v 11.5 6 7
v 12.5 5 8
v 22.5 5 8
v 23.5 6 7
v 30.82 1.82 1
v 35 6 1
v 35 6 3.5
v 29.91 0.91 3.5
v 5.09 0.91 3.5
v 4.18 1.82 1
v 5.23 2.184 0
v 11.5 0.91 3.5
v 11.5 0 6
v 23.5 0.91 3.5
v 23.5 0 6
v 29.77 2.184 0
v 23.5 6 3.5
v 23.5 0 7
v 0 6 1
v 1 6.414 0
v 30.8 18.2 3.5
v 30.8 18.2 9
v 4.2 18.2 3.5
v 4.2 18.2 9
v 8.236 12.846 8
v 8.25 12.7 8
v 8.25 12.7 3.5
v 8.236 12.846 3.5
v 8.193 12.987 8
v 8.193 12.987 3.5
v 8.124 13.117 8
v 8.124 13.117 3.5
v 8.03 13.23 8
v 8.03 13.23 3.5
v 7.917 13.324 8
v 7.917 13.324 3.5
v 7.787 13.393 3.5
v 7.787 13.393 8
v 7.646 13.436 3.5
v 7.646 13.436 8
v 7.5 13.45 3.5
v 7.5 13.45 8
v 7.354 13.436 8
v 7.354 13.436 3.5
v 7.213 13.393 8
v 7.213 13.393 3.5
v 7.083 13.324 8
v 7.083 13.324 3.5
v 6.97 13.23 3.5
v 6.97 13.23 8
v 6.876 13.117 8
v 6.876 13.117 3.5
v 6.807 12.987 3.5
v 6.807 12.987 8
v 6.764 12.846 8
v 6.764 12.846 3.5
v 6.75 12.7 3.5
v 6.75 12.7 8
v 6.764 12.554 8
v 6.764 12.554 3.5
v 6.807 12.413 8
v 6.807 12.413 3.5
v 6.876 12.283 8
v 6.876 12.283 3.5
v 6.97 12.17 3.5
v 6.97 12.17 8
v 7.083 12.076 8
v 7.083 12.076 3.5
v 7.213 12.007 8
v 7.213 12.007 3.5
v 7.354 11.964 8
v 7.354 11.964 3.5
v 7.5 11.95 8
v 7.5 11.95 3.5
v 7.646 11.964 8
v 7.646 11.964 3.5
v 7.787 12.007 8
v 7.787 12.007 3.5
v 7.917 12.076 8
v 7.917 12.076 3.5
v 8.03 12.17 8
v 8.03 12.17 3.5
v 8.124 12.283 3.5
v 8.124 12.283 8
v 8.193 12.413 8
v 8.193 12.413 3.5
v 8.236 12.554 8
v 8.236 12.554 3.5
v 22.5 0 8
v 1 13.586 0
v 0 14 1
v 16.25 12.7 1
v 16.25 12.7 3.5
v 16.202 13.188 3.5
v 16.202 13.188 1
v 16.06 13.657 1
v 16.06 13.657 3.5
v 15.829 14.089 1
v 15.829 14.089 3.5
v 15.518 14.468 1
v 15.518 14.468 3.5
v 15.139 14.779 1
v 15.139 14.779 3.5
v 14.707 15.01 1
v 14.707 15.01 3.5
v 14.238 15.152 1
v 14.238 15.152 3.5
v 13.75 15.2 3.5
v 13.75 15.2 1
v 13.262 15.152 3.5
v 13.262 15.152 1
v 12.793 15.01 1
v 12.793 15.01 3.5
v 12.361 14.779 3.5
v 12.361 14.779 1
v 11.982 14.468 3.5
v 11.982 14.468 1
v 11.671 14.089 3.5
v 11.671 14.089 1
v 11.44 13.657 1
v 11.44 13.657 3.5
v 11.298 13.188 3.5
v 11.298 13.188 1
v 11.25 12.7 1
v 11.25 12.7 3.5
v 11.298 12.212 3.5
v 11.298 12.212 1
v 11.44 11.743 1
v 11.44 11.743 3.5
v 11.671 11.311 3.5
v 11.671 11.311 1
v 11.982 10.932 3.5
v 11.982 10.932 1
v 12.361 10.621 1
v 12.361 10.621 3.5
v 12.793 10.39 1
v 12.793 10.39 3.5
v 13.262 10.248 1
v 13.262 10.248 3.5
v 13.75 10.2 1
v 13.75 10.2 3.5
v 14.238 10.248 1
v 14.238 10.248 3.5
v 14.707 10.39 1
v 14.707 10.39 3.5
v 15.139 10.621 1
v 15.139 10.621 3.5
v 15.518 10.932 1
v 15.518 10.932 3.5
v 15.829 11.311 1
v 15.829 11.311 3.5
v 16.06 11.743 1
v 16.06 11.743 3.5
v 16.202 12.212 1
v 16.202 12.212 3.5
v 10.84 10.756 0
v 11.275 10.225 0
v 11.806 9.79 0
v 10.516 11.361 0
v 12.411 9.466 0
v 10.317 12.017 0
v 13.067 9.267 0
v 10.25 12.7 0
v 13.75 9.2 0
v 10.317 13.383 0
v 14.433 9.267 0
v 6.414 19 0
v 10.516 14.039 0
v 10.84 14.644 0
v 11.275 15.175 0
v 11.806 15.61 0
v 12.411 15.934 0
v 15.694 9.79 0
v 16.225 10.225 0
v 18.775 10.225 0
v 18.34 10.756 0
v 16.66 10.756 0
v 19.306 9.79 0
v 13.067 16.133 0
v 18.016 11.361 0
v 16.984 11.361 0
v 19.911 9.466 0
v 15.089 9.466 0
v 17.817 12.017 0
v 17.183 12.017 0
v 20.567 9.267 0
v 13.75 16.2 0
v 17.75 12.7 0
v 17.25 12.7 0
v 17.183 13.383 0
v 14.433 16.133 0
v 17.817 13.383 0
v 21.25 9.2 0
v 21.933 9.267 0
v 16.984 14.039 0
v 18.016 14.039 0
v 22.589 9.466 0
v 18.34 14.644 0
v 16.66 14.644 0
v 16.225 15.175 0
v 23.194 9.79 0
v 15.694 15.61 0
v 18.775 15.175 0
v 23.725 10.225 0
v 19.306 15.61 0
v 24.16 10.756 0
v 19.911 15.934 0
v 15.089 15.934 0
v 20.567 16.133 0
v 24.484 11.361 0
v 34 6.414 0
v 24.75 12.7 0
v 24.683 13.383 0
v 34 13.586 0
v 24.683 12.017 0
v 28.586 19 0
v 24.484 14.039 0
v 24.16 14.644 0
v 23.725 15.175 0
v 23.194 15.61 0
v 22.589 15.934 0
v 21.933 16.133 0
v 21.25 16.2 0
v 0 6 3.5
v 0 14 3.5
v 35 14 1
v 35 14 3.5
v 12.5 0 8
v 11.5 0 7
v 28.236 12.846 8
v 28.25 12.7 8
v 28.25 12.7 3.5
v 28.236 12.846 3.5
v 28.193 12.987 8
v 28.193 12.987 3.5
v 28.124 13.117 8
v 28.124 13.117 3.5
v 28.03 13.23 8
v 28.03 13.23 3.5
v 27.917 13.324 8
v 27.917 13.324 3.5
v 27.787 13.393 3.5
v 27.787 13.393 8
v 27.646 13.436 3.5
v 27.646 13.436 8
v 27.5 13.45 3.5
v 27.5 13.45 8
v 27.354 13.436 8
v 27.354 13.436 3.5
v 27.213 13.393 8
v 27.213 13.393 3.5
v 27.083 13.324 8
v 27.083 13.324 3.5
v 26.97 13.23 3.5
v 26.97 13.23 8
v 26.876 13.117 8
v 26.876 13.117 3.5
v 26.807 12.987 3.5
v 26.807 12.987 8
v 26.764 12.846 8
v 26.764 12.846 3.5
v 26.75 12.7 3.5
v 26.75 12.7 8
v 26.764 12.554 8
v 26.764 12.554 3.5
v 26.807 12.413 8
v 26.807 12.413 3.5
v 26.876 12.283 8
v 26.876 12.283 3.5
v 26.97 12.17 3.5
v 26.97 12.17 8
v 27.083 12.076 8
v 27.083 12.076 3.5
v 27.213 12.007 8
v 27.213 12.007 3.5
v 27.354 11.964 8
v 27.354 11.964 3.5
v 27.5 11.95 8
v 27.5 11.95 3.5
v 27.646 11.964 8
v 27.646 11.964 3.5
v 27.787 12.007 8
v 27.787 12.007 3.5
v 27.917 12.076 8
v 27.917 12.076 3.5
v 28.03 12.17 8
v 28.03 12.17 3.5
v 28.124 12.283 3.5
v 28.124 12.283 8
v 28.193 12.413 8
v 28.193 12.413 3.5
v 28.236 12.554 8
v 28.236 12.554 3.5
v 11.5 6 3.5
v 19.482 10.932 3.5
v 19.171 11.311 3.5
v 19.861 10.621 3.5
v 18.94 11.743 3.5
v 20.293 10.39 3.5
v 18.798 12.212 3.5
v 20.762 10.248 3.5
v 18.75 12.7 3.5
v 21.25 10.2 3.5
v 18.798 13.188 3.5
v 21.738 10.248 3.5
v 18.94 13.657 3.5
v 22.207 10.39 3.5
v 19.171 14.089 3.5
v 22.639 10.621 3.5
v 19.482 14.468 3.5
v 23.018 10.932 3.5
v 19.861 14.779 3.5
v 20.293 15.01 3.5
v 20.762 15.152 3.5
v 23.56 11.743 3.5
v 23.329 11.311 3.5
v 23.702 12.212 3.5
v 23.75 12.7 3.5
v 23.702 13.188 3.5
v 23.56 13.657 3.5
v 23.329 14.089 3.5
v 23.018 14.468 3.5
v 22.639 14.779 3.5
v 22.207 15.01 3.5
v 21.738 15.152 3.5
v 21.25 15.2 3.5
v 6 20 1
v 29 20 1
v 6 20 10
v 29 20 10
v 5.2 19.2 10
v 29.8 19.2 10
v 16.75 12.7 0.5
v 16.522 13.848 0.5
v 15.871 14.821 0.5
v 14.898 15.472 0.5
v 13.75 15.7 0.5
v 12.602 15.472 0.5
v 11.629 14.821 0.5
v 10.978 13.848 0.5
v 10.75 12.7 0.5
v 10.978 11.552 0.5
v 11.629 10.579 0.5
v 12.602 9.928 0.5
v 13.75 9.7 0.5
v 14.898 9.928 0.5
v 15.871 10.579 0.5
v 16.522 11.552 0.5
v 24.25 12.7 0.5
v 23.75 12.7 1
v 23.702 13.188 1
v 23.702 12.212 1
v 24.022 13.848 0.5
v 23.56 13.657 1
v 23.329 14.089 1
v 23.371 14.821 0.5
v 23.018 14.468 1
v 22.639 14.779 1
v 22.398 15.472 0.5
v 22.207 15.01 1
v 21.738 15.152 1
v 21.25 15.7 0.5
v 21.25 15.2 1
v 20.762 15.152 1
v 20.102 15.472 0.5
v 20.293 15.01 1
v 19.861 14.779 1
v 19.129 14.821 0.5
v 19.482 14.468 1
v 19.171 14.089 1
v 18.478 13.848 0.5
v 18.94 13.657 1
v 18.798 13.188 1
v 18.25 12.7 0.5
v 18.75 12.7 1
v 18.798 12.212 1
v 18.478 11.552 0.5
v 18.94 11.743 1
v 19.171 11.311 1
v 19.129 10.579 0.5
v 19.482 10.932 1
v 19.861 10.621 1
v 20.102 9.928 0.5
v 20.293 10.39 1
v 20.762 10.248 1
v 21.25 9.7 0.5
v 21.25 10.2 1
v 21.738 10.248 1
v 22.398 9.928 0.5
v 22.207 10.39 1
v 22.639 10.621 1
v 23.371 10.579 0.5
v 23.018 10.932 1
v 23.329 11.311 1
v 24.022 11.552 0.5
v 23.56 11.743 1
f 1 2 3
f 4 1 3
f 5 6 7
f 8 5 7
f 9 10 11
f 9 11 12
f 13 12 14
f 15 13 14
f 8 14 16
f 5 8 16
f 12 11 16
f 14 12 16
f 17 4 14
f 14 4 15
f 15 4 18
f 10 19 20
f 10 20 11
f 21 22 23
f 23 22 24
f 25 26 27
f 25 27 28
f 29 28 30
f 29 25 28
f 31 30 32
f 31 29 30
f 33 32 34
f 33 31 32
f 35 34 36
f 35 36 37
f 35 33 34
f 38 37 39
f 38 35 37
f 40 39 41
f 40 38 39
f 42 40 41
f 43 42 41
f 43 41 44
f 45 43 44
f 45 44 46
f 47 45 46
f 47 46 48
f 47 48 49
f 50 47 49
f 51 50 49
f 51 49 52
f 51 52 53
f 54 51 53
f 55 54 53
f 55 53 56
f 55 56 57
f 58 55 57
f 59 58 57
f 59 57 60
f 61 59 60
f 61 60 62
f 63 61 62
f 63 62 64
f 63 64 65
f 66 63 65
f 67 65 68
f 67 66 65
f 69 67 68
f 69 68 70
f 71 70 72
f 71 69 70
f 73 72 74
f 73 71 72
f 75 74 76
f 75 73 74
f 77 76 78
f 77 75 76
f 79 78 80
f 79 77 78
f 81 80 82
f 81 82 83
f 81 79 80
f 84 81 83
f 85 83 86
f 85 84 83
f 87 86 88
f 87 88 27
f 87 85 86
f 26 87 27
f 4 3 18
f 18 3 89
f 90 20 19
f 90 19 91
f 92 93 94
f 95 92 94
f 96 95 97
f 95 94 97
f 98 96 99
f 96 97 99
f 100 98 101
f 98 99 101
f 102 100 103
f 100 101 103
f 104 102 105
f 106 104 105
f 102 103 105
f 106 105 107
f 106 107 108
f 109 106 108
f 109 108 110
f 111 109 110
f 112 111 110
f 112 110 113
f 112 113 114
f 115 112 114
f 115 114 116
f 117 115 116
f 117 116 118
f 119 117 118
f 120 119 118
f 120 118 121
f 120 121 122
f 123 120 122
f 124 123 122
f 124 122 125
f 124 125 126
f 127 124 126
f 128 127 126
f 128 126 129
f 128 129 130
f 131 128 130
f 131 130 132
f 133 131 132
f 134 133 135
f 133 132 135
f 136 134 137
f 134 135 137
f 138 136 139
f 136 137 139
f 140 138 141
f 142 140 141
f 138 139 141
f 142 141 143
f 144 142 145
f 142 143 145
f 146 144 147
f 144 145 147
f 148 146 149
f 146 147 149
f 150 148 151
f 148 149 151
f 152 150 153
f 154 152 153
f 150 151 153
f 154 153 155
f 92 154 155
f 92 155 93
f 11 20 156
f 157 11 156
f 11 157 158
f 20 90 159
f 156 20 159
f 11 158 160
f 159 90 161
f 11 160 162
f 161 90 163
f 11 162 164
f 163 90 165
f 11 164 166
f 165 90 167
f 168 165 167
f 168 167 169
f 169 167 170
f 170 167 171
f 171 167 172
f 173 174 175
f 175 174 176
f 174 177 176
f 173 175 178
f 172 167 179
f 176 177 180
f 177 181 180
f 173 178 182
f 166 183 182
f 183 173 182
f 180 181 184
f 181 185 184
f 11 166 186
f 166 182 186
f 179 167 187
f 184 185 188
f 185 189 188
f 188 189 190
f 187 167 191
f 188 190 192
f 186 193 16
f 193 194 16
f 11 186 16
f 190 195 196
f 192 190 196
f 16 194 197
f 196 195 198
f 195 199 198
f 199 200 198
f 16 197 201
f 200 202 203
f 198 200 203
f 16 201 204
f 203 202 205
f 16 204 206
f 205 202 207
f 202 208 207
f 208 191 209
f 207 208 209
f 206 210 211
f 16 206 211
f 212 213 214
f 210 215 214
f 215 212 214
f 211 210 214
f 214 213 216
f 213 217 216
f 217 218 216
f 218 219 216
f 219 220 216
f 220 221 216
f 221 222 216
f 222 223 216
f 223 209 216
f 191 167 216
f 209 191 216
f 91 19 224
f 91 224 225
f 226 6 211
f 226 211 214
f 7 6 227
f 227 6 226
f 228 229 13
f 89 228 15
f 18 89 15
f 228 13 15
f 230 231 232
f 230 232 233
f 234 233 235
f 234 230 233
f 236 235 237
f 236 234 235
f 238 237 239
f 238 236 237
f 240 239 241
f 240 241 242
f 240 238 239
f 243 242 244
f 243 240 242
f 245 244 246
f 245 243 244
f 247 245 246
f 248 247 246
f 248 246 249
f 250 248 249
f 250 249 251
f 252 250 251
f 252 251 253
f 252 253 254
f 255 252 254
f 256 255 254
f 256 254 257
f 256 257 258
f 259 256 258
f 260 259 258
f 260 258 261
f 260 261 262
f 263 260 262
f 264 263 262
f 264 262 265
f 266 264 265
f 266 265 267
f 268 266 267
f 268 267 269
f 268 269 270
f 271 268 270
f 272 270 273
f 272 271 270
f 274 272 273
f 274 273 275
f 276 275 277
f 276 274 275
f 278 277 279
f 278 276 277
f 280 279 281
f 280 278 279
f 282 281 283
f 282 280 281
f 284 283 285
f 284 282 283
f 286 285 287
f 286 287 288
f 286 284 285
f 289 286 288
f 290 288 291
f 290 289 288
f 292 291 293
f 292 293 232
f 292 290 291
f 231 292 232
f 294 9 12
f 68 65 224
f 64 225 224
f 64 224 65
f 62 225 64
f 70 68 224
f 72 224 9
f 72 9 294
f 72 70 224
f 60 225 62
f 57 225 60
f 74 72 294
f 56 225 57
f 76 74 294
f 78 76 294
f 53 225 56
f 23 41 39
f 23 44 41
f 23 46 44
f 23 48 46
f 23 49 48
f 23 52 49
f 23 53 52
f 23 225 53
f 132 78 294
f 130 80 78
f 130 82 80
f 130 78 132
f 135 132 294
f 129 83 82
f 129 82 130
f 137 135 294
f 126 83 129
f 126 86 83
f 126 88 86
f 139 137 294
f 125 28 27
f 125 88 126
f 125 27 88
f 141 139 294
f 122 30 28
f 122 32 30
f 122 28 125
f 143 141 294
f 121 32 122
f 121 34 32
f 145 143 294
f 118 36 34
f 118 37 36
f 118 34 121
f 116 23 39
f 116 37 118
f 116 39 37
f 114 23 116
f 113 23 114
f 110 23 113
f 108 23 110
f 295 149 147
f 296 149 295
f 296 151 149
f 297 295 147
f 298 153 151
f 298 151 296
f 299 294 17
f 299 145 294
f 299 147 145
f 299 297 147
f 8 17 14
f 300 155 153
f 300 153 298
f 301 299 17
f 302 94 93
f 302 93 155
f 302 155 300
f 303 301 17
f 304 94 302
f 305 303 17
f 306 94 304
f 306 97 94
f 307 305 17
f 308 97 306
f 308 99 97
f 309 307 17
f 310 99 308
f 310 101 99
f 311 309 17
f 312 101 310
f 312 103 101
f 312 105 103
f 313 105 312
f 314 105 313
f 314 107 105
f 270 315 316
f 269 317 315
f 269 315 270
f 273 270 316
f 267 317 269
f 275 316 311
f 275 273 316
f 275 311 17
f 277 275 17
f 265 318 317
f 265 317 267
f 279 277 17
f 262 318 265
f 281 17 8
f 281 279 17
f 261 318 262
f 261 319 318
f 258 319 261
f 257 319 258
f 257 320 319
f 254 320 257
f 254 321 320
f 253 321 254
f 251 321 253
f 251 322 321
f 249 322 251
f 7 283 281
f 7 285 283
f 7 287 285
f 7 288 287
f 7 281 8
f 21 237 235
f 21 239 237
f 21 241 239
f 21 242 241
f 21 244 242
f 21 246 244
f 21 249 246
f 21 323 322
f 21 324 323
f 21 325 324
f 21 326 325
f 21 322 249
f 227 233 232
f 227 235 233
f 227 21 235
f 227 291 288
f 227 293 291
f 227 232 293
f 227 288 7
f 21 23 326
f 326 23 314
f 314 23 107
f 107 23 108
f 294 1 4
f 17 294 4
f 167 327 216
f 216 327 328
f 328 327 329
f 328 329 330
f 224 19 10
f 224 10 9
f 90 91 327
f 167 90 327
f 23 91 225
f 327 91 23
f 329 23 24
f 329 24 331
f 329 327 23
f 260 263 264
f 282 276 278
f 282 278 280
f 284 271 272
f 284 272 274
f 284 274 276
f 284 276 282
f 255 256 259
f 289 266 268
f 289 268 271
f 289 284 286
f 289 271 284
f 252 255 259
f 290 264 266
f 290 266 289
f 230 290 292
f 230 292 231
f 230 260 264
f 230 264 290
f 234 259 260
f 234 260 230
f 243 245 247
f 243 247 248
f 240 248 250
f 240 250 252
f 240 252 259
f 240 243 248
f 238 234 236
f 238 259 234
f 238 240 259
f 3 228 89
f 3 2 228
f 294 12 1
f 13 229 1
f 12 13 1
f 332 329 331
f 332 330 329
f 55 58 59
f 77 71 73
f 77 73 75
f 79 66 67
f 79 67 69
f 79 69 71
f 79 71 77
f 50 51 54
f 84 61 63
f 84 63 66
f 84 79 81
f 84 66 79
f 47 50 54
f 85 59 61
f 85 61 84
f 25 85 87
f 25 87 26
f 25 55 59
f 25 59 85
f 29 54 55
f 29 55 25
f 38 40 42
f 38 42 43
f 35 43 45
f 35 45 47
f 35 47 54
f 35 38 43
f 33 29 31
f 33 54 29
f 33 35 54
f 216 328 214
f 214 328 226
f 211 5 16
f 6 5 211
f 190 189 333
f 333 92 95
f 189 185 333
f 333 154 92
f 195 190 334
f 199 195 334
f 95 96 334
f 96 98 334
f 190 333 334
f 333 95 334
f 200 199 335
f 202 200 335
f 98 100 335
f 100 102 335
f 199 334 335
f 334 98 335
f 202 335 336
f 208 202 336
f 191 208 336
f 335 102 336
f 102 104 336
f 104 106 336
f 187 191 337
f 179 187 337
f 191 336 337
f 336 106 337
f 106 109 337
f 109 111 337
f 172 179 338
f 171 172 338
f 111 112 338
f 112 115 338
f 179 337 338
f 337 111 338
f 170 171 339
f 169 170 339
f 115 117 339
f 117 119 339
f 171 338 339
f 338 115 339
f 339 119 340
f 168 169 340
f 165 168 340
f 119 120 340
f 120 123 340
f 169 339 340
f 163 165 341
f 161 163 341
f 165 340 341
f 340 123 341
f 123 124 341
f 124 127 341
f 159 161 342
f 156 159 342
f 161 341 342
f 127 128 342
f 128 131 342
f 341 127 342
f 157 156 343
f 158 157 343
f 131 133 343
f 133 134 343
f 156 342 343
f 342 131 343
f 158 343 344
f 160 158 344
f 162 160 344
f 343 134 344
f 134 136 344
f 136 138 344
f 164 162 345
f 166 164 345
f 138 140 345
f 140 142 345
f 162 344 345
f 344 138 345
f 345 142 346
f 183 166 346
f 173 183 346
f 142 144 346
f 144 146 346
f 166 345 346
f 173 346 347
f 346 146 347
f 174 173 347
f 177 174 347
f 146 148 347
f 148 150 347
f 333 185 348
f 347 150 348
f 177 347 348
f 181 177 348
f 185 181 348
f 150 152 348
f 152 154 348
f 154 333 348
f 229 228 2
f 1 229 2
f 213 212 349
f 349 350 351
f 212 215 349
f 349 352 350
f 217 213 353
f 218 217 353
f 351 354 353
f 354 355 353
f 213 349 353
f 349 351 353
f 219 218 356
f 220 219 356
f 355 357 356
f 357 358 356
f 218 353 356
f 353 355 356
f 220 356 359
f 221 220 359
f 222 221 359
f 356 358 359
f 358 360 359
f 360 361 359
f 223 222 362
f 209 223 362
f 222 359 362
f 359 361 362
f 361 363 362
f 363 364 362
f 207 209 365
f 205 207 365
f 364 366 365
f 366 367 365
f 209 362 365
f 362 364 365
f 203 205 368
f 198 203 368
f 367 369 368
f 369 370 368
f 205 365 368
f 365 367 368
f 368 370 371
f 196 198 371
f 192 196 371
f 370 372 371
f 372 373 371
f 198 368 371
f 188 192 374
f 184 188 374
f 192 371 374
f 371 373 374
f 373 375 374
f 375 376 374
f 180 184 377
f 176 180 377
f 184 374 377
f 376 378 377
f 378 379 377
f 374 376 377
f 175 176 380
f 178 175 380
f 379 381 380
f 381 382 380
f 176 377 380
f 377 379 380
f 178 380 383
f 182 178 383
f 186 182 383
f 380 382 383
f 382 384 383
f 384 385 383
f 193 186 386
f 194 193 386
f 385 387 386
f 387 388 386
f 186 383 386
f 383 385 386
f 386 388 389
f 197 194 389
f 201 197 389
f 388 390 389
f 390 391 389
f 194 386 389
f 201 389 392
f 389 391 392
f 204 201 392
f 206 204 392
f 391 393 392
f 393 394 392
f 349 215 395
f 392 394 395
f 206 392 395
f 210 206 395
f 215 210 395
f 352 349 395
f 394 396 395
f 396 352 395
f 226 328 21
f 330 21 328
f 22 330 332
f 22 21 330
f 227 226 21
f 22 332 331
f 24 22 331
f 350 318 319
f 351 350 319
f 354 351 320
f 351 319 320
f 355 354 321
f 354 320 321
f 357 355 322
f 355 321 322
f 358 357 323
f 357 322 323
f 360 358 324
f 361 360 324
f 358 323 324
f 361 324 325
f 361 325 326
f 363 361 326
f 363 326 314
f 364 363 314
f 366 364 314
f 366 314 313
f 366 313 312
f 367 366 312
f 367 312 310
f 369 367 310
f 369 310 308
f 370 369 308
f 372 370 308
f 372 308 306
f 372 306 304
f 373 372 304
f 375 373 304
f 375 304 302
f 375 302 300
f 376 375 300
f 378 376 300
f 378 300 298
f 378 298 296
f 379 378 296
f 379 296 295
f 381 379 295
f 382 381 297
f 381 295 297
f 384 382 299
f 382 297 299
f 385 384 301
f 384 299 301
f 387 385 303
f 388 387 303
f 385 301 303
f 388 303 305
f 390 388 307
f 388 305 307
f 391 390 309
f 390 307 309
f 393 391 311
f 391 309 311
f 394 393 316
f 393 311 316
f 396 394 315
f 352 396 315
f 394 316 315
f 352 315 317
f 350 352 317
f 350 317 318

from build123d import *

# Parameters (mm, degrees)
F0_W     = 35
F0_H     = 20
F1_DEPTH = 10
F2_R     = 0.75
F2_R_2   = 2.5
F3_DEPTH = 6.5
F4_DEPTH = 2
F5_DEPTH = 25
F6_SIZE2 = 6
F6_SIZE  = 6
F7_SIZE  = 1
F8_SIZE2 = 2.1838214056
F8_SIZE  = 6


with BuildPart() as f1:
    # F0 (on Top) → F1 (new body)
    with BuildSketch(Plane.XY):
        with Locations((17.5, 10)):
            Rectangle(F0_W, F0_H)
    extrude(amount=F1_DEPTH)

    # F2 (on face) → F3 (cut)
    with BuildSketch(Plane.XY.offset(10)):
        Polygon((35, 18.2), (0, 18.2), (0, 0), (11.5, 0), (11.5, 6), (23.5, 6), (23.5, 0), (35, 0), align=None)
        with Locations((7.5, 12.7)):
            Circle(F2_R, mode=Mode.SUBTRACT)
        with Locations((13.75, 12.7)):
            Circle(F2_R_2, mode=Mode.SUBTRACT)
        with Locations((21.25, 12.7)):
            Circle(F2_R_2, mode=Mode.SUBTRACT)
        with Locations((27.5, 12.7)):
            Circle(F2_R, mode=Mode.SUBTRACT)
    extrude(amount=-F3_DEPTH, mode=Mode.SUBTRACT)

    # F4 (cut): faces of the model
    f4_faces = [f1.faces().sort_by_distance(p)[0] for p in [
        (7.5, 12.7, 10),
        (17.5, 3, 10),
        (27.5, 12.7, 10),
    ]]
    extrude(f4_faces, amount=-F4_DEPTH, mode=Mode.SUBTRACT)

    # F5 (cut): faces of the model
    f5_faces = [f1.faces().sort_by_distance(p)[0] for p in [
        (13.75, 12.7, 10),
        (21.25, 12.7, 10),
    ]]
    extrude(f5_faces, amount=-F5_DEPTH, mode=Mode.SUBTRACT)

    # F6
    f6_edges = [f1.edges().sort_by_distance(p)[0] for p in [
        (35, 0, 1.75),
        (35, 20, 5),
        (0, 0, 1.75),
        (0, 20, 5),
    ]]
    chamfer(f6_edges, length=F6_SIZE, length2=F6_SIZE2)

    # F7
    f7_edges = [f1.edges().sort_by_distance(p)[0] for p in [
        (17.5, 20, 0),
        (32, 17, 0),
        (3, 17, 0),
        (17.5, 18.2, 10),
        (17.5, 6, 8),
        (23.5, 3, 8),
        (11.5, 3, 8),
        (35, 10, 0),
        (0, 10, 0),
        (18.75, 12.7, 0),
        (11.25, 12.7, 0),
        (3, 3, 0),
        (32, 3, 0),
    ]]
    chamfer(f7_edges, length=F7_SIZE)

    # F8
    f8_edges = [f1.edges().sort_by_distance(p)[0] for p in [
        (17.5, 0, 0),
    ]]
    f8_side = f1.faces().sort_by_distance((17.5, 0, 3.355675))[0]
    chamfer(f8_edges, length=F8_SIZE, length2=F8_SIZE2, reference=f8_side)


solid = f1.part
